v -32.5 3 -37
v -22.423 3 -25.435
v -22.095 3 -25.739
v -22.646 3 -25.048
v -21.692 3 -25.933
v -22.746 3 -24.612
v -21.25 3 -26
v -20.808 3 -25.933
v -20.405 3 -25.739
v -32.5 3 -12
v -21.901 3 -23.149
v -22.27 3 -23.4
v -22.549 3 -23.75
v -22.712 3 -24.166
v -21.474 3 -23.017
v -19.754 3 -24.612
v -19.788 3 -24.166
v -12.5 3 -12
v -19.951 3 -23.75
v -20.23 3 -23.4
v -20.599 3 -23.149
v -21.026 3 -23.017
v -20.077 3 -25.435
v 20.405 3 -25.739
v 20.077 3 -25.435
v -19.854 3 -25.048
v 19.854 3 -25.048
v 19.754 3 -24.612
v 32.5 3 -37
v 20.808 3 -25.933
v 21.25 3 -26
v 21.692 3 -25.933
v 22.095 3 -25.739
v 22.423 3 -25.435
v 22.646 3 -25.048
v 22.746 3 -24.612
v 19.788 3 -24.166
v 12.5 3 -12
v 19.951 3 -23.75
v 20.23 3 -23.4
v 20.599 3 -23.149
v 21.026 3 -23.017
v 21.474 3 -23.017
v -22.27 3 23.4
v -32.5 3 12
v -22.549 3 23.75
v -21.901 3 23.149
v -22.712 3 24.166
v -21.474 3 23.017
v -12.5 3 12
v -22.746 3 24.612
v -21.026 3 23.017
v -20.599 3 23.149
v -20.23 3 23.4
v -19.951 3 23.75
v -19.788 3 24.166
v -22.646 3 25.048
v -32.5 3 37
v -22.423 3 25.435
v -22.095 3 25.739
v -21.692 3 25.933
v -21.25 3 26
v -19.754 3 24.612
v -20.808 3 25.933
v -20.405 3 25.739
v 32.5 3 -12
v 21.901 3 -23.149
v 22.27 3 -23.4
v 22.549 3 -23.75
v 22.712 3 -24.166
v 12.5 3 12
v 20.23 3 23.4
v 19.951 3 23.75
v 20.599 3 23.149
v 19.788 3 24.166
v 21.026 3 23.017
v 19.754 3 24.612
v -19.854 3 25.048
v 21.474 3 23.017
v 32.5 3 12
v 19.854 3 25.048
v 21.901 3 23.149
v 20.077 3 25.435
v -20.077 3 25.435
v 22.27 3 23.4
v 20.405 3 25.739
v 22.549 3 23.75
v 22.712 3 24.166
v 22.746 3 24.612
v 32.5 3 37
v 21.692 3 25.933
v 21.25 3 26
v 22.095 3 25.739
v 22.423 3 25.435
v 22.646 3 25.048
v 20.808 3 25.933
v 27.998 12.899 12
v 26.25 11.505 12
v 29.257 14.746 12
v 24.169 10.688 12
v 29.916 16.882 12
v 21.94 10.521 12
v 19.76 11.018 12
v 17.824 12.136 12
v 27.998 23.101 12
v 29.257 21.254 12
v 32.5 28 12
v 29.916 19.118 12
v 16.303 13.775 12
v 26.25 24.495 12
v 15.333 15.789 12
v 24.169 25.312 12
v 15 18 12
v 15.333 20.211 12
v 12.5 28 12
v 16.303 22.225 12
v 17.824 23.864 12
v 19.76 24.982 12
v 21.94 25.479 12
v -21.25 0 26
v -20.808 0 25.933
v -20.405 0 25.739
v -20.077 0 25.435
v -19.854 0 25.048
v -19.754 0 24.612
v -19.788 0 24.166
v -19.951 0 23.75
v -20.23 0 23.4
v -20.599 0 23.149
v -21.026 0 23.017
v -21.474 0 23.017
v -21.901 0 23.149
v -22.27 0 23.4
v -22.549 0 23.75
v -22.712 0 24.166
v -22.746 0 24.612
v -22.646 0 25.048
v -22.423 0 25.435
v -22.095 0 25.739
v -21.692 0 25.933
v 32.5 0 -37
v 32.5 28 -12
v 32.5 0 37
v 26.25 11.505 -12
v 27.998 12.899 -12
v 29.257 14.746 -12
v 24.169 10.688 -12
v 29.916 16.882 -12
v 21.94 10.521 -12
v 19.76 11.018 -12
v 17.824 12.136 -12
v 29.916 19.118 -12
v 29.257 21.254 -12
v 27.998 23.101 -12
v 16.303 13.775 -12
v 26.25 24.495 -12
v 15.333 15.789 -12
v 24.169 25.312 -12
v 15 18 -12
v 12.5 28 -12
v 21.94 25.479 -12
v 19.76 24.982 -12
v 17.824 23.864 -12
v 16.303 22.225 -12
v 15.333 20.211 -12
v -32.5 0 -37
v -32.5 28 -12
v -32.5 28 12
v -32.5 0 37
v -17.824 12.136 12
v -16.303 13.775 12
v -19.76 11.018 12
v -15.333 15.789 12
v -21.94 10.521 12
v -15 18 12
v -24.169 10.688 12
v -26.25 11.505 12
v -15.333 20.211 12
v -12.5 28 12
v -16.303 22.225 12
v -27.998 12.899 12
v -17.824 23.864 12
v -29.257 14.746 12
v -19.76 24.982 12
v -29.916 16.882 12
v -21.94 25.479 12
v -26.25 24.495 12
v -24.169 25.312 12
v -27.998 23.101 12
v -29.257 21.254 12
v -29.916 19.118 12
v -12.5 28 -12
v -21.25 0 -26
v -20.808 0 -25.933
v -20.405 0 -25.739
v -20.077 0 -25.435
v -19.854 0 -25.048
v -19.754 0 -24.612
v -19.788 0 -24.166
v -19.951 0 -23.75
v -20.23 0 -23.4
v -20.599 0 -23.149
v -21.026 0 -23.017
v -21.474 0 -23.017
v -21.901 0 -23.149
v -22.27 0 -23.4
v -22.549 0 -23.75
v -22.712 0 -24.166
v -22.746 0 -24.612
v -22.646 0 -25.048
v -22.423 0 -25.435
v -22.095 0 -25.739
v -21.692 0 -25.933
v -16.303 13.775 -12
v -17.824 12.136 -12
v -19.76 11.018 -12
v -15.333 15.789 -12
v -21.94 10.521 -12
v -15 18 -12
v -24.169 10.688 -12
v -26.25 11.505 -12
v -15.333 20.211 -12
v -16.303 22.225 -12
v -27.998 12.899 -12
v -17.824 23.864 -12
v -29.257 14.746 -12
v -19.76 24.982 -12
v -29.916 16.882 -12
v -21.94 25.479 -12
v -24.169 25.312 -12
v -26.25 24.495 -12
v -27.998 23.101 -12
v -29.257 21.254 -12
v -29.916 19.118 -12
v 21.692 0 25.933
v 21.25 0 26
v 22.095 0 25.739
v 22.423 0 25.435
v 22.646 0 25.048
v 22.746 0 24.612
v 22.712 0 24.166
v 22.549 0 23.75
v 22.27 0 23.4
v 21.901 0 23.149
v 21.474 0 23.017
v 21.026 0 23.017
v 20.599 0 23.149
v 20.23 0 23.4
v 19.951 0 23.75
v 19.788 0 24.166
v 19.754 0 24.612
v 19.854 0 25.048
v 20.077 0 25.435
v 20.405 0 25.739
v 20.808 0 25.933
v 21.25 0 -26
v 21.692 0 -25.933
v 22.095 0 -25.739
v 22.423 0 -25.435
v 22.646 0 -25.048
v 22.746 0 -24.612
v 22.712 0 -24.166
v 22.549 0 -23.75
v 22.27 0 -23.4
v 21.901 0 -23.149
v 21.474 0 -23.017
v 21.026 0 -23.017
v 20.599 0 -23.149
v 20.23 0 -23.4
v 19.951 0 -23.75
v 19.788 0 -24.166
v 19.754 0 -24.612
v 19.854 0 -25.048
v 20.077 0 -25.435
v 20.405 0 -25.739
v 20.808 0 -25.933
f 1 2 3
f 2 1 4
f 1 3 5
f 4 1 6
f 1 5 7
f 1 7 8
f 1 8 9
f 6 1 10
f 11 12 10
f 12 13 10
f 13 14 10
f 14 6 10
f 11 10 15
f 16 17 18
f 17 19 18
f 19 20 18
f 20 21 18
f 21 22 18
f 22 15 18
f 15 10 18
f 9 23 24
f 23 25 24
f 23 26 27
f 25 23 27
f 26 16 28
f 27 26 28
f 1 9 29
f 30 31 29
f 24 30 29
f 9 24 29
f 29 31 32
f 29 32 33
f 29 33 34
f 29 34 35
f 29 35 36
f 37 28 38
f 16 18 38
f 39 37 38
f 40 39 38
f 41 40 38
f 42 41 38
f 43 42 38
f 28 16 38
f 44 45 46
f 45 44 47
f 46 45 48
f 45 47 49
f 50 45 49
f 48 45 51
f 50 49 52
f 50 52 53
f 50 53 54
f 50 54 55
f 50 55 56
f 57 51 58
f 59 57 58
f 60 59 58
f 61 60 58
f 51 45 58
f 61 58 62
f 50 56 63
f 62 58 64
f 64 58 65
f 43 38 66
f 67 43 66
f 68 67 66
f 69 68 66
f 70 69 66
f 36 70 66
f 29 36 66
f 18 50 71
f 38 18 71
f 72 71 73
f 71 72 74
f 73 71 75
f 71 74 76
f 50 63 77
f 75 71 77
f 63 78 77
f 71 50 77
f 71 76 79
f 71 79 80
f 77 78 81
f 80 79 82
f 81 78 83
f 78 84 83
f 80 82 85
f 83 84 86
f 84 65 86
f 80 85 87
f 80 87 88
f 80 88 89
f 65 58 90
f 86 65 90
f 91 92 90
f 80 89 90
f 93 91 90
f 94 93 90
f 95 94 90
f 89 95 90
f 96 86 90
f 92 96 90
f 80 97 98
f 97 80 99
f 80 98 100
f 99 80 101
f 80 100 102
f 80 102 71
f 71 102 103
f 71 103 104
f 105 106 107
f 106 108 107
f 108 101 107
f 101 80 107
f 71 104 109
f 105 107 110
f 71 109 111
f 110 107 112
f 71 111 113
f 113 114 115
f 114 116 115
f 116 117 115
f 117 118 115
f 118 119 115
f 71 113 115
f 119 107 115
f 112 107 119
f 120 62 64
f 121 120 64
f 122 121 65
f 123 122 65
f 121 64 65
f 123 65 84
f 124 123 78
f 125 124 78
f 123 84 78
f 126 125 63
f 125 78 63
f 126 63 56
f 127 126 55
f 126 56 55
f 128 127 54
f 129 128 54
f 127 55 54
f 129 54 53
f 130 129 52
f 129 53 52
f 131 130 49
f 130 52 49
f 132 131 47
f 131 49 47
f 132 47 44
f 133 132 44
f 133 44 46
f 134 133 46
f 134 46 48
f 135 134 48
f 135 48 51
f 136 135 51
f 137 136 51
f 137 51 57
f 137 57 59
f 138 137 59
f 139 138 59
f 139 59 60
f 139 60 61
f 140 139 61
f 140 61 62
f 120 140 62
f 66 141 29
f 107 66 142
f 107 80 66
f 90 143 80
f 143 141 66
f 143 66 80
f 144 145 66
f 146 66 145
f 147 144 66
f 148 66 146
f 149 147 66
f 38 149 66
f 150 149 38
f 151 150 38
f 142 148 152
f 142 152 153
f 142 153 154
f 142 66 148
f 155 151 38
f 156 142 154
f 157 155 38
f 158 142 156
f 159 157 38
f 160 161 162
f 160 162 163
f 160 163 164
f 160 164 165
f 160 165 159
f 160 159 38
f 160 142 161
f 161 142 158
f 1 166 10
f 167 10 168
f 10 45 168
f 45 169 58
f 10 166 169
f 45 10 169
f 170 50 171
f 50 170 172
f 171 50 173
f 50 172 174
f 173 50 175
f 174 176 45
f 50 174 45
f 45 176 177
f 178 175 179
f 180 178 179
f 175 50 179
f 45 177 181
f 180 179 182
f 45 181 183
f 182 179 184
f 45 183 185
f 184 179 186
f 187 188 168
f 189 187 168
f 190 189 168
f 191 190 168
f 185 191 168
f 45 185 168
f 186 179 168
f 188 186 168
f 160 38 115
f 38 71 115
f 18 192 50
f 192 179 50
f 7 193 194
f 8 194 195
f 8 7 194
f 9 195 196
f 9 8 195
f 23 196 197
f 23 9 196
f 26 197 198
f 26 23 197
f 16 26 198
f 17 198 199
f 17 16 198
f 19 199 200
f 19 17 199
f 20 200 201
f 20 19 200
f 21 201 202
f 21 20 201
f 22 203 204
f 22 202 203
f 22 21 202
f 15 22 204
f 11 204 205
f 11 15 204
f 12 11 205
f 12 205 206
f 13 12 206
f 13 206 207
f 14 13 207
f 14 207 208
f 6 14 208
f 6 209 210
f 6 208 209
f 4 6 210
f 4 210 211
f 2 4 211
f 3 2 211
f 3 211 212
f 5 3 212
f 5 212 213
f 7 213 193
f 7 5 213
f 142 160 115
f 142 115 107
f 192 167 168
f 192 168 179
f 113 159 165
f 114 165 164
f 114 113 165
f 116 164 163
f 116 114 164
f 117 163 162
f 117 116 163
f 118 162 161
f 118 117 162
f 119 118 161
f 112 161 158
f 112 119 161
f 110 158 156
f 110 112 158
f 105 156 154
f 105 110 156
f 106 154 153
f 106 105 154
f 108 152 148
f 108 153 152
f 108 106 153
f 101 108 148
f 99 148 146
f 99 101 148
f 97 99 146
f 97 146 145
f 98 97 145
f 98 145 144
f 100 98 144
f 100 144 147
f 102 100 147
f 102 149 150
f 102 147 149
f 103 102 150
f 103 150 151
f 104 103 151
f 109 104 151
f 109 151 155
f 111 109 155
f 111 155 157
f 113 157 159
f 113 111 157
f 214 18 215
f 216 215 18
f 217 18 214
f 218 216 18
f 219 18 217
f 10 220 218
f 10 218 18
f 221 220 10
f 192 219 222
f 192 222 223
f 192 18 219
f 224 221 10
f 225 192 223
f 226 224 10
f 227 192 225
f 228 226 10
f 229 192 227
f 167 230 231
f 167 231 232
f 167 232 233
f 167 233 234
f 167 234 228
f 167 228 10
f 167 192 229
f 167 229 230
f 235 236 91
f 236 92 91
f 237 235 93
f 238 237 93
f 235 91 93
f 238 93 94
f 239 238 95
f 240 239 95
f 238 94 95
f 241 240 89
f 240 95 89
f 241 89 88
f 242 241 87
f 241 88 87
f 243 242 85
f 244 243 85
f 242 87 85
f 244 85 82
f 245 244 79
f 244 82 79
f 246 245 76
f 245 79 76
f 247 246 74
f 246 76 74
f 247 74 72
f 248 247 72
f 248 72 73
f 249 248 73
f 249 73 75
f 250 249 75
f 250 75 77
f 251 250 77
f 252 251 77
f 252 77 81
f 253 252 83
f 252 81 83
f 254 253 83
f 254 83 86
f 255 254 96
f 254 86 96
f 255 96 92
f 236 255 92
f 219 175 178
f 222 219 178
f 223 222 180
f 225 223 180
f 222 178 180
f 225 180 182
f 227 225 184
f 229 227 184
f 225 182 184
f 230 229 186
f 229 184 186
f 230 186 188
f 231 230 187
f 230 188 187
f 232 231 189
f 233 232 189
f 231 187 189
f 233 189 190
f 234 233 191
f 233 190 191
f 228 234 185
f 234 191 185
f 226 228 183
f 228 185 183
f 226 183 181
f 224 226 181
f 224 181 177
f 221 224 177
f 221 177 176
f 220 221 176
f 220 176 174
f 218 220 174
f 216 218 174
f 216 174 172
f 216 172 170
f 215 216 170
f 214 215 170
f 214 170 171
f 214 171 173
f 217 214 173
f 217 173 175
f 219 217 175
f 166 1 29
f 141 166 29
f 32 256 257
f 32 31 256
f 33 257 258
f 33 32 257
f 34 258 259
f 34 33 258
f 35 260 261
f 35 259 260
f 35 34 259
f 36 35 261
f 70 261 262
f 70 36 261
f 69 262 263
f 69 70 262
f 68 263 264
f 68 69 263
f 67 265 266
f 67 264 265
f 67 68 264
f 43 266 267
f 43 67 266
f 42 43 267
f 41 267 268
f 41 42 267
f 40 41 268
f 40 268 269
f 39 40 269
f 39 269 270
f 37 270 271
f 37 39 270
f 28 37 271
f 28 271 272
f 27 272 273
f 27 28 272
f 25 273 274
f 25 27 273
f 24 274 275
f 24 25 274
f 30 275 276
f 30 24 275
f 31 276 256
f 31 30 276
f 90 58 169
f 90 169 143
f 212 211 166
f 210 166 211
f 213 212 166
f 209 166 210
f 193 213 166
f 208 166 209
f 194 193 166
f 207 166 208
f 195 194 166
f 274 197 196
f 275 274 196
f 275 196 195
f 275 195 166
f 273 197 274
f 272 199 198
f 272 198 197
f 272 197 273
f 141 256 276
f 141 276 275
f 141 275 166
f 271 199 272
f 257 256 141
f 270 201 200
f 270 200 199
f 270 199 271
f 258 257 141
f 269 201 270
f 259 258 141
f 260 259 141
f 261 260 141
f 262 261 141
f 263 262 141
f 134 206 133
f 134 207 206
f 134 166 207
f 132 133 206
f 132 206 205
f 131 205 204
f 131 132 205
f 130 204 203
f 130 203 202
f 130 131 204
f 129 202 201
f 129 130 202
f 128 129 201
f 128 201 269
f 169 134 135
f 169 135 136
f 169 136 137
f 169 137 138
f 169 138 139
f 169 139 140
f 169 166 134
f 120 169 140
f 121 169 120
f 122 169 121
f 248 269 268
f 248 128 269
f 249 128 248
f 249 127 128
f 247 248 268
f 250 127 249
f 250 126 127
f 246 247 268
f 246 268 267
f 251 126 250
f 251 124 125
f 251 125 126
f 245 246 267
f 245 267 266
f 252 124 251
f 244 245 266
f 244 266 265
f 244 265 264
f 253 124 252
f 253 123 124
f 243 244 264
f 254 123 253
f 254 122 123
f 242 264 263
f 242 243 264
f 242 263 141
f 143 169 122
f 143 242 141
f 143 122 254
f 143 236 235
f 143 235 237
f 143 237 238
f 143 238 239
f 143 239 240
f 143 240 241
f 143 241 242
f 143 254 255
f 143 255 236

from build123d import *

# Parameters (mm, degrees)
BOSS_EXTRUDE1_DEPTH = 12
SKETCH2_R           = 7.5
CUT_EXTRUDE1_DEPTH  = 50.155365933
SKETCH3_W           = 65
SKETCH3_H           = 3
BOSS_EXTRUDE2_DEPTH = 25
SKETCH4_R           = 1.5
CUT_EXTRUDE2_DEPTH  = 56.229068433


with BuildPart() as part:
    # Sketch1 → Boss-Extrude1 (new, symmetric)
    with BuildSketch(Plane.XY):
        Polygon((32.5, 0), (-32.5, 0), (-32.5, 28), (-12.5, 28), (-12.5, 3), (12.5, 3), (12.5, 28), (32.5, 28), align=None)
    extrude(amount=BOSS_EXTRUDE1_DEPTH, both=True)

    # Sketch2 → Cut-Extrude1 (cut, through all)
    with BuildSketch(Plane.XY.offset(12)):
        with Locations((-22.5, 18)):
            Circle(SKETCH2_R)
    cut_extrude1 = extrude(amount=-CUT_EXTRUDE1_DEPTH, mode=Mode.SUBTRACT)

    # Mirror1: Cut-Extrude1 across plane
    add(cut_extrude1.mirror(Plane(origin=(0, 0, 0), x_dir=(0, 0, 1), z_dir=(1, 0, 0))), mode=Mode.SUBTRACT)

    # Sketch3 → Boss-Extrude2 (add)
    with BuildSketch(Plane.XY.offset(12)):
        with Locations((0, 1.5)):
            Rectangle(SKETCH3_W, SKETCH3_H)
    boss_extrude2 = extrude(amount=BOSS_EXTRUDE2_DEPTH)

    # Sketch4 → Cut-Extrude2 (cut, symmetric)
    with BuildSketch(Plane(origin=(0, 3, 0), x_dir=(1, 0, 0), z_dir=(0, 1, 0))):
        with Locations(Location((-21.25, -24.5, 0), (0, 0, 270))):
            Circle(SKETCH4_R)
        with Locations(Location((21.25, -24.5, 0), (0, 0, 270))):
            Circle(SKETCH4_R)
    cut_extrude2 = extrude(amount=CUT_EXTRUDE2_DEPTH, both=True, mode=Mode.SUBTRACT)

    # Mirror2: Boss-Extrude2, Cut-Extrude2 across plane
    add(boss_extrude2.mirror(Plane.XY))
    add(cut_extrude2.mirror(Plane.XY), mode=Mode.SUBTRACT)


solid = part.part
